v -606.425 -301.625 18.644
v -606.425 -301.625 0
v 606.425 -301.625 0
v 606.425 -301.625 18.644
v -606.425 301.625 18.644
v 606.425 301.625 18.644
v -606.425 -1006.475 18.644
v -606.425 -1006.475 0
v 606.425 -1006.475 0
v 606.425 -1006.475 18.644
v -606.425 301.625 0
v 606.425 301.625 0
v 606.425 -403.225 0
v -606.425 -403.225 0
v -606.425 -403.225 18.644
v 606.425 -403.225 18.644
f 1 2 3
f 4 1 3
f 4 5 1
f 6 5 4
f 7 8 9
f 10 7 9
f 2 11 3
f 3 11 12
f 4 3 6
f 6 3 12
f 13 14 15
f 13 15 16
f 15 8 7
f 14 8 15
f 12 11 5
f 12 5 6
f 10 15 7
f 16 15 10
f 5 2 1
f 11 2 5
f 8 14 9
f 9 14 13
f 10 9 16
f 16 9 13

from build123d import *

# Parameters (mm, degrees)
F0_W     = 1212.85
F0_H     = 603.25
F1_DEPTH = 18.6436


# Not quite as in the source:
# - the program builds the solid bodies; features that only make, move or delete a surface that nothing else refers to are left out


with BuildPart() as f1:
    # F0 (on Top) → F1 (new body)
    with BuildSketch(Plane.XY):
        Rectangle(F0_W, F0_H)
    extrude(amount=F1_DEPTH)


with BuildPart() as f1b:
    # F0 (on Top) → F1, piece 2 (new body)
    with BuildSketch(Plane.XY):
        with Locations((0, -704.85)):
            Rectangle(F0_W, F0_H)
    extrude(amount=F1_DEPTH)


solid = Compound([f1.part, f1b.part])
